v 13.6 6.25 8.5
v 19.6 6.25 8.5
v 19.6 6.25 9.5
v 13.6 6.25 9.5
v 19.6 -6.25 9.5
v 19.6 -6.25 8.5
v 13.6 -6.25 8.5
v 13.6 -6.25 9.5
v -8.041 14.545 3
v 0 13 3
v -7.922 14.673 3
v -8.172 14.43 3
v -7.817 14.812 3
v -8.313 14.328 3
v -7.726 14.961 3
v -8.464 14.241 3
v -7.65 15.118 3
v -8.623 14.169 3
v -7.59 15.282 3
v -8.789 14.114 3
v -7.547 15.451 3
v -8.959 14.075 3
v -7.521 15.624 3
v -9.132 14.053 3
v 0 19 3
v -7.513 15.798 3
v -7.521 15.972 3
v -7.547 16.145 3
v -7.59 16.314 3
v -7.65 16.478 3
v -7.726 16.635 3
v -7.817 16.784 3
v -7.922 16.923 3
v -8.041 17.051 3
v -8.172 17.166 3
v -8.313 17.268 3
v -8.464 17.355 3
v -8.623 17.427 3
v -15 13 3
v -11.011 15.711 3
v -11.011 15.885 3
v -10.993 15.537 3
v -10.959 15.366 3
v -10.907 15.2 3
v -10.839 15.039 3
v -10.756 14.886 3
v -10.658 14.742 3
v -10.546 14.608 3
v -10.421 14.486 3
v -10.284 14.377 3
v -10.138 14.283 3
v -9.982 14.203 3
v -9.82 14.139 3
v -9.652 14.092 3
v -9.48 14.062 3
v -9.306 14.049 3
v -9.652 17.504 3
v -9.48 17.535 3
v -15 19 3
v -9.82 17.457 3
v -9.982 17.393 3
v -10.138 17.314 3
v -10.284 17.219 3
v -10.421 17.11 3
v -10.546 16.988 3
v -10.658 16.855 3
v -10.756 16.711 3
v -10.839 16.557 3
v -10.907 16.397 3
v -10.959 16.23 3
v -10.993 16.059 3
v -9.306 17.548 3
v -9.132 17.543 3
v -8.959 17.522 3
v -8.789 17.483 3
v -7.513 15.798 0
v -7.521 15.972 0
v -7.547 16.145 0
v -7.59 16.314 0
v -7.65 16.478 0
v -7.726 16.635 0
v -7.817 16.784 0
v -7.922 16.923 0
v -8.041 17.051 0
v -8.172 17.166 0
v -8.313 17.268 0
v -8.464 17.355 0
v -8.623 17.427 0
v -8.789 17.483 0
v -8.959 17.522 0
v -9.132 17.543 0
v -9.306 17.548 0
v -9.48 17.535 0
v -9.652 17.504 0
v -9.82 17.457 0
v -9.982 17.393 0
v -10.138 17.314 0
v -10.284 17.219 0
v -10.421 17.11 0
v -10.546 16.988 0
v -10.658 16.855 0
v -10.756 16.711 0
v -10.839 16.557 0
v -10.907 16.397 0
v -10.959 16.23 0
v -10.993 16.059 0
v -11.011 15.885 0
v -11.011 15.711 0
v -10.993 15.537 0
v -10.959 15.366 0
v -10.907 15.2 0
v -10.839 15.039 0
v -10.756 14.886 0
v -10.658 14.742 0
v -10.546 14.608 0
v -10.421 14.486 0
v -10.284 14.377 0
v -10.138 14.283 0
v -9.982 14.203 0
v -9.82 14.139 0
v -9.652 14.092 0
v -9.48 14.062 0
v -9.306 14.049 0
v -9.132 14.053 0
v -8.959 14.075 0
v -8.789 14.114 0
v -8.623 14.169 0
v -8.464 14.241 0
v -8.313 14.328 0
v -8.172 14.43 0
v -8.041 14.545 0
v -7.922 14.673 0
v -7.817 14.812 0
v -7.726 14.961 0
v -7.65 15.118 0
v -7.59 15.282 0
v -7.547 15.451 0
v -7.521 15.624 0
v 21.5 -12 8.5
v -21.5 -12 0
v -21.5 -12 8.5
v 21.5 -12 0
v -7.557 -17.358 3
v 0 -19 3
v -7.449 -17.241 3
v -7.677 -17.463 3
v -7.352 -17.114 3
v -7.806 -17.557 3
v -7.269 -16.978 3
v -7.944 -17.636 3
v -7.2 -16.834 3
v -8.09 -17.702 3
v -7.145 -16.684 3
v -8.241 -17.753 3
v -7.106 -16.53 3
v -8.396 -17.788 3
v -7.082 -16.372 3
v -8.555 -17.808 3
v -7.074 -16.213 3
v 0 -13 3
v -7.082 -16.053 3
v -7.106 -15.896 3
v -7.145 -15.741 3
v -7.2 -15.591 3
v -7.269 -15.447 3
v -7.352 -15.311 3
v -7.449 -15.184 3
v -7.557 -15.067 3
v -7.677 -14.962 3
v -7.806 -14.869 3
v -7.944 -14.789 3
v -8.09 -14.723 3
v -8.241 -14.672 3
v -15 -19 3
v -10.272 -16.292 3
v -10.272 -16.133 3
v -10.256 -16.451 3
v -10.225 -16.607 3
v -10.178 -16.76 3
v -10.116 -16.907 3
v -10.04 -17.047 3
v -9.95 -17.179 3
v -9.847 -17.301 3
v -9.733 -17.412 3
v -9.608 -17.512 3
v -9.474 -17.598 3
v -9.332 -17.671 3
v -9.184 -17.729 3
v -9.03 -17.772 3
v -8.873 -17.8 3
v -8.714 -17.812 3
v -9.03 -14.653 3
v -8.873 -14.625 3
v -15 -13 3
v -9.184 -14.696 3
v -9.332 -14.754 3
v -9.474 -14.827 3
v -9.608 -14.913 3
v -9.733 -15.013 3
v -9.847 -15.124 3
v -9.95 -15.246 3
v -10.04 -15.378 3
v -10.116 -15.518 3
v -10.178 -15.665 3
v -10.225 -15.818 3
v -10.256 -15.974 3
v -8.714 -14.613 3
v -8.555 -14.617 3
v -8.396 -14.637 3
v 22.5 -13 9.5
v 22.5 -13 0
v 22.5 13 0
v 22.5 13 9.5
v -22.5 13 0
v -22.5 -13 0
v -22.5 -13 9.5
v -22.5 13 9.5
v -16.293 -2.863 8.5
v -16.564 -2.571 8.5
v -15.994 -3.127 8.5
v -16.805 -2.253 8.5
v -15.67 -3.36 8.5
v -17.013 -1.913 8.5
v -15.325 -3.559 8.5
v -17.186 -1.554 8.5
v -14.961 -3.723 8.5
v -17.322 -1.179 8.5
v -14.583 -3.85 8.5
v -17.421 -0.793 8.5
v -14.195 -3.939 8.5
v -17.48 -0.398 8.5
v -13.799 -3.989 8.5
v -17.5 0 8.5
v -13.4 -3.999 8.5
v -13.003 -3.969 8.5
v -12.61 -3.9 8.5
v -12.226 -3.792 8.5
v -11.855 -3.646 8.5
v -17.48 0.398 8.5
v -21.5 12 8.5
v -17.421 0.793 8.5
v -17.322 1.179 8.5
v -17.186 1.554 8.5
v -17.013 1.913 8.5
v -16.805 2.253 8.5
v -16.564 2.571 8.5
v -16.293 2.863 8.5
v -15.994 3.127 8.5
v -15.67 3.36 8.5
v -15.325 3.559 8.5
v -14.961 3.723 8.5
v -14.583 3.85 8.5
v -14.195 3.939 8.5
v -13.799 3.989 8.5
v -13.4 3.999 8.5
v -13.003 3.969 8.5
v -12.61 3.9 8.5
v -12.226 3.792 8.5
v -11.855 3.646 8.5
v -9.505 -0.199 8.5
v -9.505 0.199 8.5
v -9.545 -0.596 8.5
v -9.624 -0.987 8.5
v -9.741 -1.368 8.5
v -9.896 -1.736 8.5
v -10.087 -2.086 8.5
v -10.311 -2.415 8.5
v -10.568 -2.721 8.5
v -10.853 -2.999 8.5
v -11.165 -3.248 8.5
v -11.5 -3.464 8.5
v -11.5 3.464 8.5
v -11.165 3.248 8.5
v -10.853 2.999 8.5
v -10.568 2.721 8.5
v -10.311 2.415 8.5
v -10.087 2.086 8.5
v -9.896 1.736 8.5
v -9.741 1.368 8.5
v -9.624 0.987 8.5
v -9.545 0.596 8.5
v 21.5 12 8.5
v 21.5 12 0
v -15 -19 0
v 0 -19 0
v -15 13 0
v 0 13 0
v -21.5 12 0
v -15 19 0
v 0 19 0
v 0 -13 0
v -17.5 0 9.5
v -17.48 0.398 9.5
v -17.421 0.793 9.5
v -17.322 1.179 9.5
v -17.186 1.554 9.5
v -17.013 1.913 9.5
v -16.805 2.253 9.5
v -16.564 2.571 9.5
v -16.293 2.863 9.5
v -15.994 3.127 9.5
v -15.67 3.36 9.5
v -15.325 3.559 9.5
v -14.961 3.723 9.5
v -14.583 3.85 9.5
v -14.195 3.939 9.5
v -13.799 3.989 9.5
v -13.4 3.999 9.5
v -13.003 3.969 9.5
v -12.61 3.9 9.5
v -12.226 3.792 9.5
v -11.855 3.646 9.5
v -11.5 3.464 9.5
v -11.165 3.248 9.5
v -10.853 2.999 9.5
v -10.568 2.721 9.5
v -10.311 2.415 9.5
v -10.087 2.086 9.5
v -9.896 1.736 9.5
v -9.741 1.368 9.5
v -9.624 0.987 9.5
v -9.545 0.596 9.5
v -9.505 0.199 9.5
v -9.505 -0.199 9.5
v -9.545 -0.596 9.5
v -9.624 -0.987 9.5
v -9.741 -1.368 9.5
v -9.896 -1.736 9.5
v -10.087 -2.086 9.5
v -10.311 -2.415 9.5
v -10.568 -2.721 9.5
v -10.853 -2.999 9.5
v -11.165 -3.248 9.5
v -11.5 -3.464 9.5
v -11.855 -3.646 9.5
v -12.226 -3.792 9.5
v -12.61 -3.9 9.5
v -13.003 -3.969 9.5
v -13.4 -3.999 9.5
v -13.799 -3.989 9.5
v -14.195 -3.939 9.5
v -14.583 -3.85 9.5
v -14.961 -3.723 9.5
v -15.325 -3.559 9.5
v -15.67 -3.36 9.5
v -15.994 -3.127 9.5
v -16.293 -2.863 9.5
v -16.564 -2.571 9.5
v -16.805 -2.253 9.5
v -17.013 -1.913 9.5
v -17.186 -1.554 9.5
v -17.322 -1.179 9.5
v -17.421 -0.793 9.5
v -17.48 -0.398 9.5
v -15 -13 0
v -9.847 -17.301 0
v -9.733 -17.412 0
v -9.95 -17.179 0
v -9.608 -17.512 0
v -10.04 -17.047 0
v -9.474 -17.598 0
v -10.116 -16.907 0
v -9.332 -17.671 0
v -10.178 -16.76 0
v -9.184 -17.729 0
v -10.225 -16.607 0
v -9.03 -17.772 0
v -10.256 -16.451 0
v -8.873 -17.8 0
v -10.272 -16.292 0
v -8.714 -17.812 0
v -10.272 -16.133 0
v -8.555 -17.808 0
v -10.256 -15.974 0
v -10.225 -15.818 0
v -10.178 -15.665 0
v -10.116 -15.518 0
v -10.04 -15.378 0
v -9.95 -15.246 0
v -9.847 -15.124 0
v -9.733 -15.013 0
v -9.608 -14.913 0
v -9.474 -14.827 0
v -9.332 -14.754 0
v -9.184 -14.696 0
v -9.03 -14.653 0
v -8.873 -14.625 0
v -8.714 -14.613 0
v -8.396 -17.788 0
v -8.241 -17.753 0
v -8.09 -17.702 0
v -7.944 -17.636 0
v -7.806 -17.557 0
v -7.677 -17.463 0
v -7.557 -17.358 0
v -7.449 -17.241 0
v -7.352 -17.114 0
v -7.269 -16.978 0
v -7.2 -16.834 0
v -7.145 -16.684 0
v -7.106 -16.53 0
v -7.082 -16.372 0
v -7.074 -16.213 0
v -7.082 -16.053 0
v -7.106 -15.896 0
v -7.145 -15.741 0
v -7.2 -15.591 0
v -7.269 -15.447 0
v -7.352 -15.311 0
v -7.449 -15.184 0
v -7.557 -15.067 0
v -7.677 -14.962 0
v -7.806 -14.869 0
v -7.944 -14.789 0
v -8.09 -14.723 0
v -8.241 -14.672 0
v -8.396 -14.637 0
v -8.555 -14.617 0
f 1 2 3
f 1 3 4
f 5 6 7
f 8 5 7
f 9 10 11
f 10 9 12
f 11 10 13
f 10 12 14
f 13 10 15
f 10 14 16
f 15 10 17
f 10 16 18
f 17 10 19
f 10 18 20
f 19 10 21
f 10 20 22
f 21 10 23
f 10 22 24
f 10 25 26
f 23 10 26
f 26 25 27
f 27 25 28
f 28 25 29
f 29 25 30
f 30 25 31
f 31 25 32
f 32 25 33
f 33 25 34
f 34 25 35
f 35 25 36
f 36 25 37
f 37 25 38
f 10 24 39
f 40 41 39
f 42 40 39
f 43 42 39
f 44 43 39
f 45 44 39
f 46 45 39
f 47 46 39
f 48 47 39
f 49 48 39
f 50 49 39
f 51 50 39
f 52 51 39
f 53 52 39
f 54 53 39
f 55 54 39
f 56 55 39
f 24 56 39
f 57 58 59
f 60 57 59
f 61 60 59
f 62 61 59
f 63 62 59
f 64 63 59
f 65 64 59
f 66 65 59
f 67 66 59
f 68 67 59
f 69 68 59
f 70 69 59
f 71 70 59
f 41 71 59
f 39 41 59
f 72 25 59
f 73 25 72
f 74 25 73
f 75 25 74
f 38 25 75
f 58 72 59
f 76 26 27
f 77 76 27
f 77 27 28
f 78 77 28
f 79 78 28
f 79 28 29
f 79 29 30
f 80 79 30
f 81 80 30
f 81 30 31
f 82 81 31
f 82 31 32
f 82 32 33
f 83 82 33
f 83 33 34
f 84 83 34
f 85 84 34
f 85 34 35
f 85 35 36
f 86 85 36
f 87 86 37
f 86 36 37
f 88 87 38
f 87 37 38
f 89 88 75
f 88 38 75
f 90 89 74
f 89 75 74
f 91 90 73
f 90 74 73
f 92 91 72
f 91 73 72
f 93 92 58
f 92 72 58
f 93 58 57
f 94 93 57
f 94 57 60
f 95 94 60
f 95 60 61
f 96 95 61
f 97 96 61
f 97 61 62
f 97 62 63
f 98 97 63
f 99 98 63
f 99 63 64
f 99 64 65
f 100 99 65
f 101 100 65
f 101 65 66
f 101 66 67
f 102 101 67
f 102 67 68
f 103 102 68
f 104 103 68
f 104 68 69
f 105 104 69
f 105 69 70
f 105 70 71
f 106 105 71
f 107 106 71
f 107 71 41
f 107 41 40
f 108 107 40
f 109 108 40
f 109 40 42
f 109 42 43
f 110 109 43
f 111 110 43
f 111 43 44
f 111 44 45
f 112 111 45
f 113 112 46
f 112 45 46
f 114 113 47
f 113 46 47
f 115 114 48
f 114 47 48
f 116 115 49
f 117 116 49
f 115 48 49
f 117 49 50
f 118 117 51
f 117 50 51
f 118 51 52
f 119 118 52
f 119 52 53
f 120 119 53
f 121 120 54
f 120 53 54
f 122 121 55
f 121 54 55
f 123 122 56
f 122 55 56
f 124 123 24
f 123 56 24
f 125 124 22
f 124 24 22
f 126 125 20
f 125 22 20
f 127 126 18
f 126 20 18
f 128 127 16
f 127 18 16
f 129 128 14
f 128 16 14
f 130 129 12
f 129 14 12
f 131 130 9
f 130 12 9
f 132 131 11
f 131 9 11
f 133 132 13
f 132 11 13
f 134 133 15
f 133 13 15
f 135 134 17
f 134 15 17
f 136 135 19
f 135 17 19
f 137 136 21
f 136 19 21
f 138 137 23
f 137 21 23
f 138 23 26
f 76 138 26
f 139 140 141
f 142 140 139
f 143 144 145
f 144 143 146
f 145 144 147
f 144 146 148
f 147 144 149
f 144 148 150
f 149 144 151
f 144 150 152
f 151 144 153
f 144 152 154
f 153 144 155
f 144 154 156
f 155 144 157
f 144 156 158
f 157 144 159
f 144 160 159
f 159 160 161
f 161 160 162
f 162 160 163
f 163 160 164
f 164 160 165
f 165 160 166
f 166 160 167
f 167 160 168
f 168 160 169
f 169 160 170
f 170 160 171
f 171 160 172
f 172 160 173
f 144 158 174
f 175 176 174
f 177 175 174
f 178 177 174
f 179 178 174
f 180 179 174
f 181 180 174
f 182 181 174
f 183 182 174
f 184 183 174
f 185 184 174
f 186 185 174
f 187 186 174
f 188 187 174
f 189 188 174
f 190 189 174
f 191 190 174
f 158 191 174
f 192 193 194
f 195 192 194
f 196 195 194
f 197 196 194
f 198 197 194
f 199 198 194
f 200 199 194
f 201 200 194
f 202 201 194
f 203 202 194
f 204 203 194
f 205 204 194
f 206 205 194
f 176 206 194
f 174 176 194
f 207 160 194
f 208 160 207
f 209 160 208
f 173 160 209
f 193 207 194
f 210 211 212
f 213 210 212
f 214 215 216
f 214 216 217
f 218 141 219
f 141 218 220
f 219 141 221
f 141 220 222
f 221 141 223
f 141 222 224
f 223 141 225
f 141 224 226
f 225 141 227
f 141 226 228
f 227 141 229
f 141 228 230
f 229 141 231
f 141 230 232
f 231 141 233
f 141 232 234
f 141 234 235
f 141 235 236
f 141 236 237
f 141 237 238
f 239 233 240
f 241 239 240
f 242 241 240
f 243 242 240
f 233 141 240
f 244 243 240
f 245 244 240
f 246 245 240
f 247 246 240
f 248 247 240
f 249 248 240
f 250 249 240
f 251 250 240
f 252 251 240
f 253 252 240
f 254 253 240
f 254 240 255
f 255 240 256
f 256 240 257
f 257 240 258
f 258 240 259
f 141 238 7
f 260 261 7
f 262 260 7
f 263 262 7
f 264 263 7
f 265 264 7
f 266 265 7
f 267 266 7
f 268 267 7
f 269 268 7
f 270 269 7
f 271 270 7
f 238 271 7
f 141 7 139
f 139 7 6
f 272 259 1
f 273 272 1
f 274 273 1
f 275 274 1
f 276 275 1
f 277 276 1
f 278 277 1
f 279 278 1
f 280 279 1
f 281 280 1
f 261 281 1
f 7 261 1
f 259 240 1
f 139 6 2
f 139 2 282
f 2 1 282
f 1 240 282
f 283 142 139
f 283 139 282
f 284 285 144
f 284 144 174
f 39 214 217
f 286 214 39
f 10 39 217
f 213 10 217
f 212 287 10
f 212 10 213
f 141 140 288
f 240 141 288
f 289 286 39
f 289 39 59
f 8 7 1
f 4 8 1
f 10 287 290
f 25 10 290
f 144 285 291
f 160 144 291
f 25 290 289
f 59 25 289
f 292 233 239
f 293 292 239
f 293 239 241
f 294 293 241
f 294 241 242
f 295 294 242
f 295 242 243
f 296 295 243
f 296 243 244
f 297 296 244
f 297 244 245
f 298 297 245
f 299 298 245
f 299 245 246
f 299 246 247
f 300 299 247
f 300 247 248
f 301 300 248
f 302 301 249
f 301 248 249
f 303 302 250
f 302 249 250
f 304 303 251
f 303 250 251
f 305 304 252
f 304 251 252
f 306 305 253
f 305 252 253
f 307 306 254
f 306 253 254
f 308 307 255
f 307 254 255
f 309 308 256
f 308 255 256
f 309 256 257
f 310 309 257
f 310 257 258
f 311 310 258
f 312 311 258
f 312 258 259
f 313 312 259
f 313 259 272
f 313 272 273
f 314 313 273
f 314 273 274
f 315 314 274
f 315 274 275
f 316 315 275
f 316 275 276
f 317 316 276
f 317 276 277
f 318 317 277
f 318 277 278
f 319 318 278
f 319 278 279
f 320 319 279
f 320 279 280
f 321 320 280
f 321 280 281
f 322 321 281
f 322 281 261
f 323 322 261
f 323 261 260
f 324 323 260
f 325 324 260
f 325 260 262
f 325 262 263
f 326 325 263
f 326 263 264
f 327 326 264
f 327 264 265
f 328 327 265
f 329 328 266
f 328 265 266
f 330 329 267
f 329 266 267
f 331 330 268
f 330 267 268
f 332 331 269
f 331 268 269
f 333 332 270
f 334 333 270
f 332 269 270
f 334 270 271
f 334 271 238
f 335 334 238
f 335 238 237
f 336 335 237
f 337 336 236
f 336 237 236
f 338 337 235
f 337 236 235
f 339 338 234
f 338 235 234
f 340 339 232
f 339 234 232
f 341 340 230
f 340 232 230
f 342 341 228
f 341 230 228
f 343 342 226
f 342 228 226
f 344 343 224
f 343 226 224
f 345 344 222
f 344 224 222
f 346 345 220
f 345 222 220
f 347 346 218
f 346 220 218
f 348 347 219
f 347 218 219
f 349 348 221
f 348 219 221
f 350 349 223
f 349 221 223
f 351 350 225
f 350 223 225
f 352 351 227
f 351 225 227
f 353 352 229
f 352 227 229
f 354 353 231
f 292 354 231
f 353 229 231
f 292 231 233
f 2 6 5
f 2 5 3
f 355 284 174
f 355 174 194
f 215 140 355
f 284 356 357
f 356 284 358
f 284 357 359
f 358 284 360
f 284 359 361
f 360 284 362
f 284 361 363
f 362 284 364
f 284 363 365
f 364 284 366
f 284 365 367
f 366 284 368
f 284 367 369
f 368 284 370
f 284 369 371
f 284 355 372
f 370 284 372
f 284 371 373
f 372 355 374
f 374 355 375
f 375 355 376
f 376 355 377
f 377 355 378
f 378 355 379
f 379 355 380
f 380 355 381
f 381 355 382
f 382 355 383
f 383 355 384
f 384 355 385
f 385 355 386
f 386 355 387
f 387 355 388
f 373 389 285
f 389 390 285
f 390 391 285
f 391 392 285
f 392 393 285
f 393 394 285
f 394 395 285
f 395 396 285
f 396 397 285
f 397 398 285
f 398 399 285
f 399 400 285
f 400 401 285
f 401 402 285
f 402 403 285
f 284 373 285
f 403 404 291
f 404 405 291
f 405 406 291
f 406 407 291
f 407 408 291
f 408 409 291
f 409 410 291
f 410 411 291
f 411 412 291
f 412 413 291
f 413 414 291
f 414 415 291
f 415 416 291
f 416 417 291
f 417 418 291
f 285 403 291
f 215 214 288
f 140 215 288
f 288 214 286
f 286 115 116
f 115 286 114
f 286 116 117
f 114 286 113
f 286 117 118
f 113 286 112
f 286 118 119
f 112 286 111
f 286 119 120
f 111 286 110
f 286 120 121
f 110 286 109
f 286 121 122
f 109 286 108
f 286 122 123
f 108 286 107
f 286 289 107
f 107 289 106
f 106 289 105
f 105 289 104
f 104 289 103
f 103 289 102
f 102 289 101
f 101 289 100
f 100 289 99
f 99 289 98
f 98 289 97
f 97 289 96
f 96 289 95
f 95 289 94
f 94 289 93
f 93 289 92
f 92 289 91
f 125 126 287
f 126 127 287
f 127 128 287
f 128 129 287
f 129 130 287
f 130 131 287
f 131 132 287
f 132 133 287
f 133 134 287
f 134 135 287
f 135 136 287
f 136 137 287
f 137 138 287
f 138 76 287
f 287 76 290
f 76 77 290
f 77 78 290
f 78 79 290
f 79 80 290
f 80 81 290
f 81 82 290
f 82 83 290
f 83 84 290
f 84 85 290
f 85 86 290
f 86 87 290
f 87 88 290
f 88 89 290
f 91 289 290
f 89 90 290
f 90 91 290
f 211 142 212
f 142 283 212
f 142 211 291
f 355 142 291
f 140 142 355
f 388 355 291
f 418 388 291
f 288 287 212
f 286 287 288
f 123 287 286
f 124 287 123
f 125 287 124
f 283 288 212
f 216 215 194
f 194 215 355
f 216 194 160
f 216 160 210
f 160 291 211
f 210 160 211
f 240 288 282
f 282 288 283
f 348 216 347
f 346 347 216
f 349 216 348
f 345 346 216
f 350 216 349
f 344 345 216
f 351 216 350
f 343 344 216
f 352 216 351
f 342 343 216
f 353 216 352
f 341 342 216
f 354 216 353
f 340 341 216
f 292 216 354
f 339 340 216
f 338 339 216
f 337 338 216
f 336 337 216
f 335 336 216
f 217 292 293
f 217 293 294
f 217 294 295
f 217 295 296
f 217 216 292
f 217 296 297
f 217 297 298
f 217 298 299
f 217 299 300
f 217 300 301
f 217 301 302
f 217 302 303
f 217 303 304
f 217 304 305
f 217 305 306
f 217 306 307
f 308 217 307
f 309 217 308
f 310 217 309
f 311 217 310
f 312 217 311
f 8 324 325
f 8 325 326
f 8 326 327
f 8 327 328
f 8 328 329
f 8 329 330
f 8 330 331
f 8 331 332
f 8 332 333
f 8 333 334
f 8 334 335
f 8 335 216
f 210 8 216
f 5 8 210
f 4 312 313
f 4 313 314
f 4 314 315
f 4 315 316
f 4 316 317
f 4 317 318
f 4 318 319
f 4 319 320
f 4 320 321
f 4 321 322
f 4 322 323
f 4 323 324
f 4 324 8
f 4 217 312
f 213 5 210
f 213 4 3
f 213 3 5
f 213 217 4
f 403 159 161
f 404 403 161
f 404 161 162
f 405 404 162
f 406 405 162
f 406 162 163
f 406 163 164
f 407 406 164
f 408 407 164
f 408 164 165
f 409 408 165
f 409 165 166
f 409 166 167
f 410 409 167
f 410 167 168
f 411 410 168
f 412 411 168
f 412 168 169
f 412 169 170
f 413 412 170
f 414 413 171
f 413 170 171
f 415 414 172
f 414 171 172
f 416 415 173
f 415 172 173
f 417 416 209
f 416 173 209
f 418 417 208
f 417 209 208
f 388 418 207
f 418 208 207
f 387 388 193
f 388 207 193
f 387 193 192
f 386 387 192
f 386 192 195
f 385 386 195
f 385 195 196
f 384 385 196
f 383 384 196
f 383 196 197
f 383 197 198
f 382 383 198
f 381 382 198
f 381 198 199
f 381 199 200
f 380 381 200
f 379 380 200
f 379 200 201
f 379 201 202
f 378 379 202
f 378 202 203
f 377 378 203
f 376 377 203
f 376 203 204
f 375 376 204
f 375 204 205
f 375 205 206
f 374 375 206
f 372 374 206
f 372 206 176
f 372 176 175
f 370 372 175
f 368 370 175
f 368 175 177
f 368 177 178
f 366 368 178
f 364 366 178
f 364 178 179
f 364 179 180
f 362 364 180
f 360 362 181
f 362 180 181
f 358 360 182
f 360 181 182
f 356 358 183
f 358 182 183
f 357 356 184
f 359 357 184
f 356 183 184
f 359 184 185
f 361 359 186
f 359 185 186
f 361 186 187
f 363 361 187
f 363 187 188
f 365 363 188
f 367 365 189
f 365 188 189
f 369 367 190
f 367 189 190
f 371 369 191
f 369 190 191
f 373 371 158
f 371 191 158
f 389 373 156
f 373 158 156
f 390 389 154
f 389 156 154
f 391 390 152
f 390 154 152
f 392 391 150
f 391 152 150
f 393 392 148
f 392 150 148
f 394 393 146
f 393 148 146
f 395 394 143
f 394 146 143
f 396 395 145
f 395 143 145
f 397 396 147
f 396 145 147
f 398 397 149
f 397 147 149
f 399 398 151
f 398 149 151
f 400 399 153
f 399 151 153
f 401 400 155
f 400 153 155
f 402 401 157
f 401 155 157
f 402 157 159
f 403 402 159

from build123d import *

# Parameters (mm, degrees)
SKETCH1_W           = 45
SKETCH1_H           = 26
BOSS_EXTRUDE2_DEPTH = 9.5
SHELL2_T            = -1
SKETCH2_R           = 4
SKETCH2_W           = 6
SKETCH2_H           = 12.5
CUT_EXTRUDE1_DEPTH  = 9.5
SKETCH3_W           = 15
SKETCH3_H           = 6
BOSS_EXTRUDE4_DEPTH = 3
SKETCH4_R           = 1.6
CUT_EXTRUDE2_DEPTH  = 9
SKETCH5_R           = 1.75
CUT_EXTRUDE3_DEPTH  = 9


with BuildPart() as part:
    # Sketch1 → Boss-Extrude2 (new body)
    with BuildSketch(Plane.XY):
        Rectangle(SKETCH1_W, SKETCH1_H)
    extrude(amount=BOSS_EXTRUDE2_DEPTH)

    # Shell2
    shell2_openings = [part.faces().sort_by_distance(p)[0] for p in [
        (0, 0, 0),
    ]]
    offset(amount=SHELL2_T, openings=shell2_openings, kind=Kind.INTERSECTION)

    # Sketch2 → Cut-Extrude1 (cut)
    with BuildSketch(Plane(origin=(0, 0, 8.5), x_dir=(-1, 0, 0), z_dir=(0, 0, -1))):
        with Locations((13.5, 0)):
            Circle(SKETCH2_R)
        with Locations((-16.6, 0)):
            Rectangle(SKETCH2_W, SKETCH2_H)
    extrude(amount=-CUT_EXTRUDE1_DEPTH, mode=Mode.SUBTRACT)

    # Sketch3 → Boss-Extrude4 (add)
    with BuildSketch(Plane(origin=(0, 0, 0), x_dir=(-1, 0, 0), z_dir=(0, 0, -1))):
        with Locations((7.5, 16)):
            Rectangle(SKETCH3_W, SKETCH3_H)
        with Locations((7.5, -16)):
            Rectangle(SKETCH3_W, SKETCH3_H)
    extrude(amount=-BOSS_EXTRUDE4_DEPTH)

    # Sketch4 → Cut-Extrude2 (cut)
    with BuildSketch(Plane.XY.offset(3)):
        with Locations((-8.674253425, -16.212560211)):
            Circle(SKETCH4_R)
    extrude(amount=-CUT_EXTRUDE2_DEPTH, mode=Mode.SUBTRACT)

    # Sketch5 → Cut-Extrude3 (cut)
    with BuildSketch(Plane.XY.offset(3)):
        with Locations((-9.262710237, 15.798173241)):
            Circle(SKETCH5_R)
    extrude(amount=-CUT_EXTRUDE3_DEPTH, mode=Mode.SUBTRACT)


solid = part.part
